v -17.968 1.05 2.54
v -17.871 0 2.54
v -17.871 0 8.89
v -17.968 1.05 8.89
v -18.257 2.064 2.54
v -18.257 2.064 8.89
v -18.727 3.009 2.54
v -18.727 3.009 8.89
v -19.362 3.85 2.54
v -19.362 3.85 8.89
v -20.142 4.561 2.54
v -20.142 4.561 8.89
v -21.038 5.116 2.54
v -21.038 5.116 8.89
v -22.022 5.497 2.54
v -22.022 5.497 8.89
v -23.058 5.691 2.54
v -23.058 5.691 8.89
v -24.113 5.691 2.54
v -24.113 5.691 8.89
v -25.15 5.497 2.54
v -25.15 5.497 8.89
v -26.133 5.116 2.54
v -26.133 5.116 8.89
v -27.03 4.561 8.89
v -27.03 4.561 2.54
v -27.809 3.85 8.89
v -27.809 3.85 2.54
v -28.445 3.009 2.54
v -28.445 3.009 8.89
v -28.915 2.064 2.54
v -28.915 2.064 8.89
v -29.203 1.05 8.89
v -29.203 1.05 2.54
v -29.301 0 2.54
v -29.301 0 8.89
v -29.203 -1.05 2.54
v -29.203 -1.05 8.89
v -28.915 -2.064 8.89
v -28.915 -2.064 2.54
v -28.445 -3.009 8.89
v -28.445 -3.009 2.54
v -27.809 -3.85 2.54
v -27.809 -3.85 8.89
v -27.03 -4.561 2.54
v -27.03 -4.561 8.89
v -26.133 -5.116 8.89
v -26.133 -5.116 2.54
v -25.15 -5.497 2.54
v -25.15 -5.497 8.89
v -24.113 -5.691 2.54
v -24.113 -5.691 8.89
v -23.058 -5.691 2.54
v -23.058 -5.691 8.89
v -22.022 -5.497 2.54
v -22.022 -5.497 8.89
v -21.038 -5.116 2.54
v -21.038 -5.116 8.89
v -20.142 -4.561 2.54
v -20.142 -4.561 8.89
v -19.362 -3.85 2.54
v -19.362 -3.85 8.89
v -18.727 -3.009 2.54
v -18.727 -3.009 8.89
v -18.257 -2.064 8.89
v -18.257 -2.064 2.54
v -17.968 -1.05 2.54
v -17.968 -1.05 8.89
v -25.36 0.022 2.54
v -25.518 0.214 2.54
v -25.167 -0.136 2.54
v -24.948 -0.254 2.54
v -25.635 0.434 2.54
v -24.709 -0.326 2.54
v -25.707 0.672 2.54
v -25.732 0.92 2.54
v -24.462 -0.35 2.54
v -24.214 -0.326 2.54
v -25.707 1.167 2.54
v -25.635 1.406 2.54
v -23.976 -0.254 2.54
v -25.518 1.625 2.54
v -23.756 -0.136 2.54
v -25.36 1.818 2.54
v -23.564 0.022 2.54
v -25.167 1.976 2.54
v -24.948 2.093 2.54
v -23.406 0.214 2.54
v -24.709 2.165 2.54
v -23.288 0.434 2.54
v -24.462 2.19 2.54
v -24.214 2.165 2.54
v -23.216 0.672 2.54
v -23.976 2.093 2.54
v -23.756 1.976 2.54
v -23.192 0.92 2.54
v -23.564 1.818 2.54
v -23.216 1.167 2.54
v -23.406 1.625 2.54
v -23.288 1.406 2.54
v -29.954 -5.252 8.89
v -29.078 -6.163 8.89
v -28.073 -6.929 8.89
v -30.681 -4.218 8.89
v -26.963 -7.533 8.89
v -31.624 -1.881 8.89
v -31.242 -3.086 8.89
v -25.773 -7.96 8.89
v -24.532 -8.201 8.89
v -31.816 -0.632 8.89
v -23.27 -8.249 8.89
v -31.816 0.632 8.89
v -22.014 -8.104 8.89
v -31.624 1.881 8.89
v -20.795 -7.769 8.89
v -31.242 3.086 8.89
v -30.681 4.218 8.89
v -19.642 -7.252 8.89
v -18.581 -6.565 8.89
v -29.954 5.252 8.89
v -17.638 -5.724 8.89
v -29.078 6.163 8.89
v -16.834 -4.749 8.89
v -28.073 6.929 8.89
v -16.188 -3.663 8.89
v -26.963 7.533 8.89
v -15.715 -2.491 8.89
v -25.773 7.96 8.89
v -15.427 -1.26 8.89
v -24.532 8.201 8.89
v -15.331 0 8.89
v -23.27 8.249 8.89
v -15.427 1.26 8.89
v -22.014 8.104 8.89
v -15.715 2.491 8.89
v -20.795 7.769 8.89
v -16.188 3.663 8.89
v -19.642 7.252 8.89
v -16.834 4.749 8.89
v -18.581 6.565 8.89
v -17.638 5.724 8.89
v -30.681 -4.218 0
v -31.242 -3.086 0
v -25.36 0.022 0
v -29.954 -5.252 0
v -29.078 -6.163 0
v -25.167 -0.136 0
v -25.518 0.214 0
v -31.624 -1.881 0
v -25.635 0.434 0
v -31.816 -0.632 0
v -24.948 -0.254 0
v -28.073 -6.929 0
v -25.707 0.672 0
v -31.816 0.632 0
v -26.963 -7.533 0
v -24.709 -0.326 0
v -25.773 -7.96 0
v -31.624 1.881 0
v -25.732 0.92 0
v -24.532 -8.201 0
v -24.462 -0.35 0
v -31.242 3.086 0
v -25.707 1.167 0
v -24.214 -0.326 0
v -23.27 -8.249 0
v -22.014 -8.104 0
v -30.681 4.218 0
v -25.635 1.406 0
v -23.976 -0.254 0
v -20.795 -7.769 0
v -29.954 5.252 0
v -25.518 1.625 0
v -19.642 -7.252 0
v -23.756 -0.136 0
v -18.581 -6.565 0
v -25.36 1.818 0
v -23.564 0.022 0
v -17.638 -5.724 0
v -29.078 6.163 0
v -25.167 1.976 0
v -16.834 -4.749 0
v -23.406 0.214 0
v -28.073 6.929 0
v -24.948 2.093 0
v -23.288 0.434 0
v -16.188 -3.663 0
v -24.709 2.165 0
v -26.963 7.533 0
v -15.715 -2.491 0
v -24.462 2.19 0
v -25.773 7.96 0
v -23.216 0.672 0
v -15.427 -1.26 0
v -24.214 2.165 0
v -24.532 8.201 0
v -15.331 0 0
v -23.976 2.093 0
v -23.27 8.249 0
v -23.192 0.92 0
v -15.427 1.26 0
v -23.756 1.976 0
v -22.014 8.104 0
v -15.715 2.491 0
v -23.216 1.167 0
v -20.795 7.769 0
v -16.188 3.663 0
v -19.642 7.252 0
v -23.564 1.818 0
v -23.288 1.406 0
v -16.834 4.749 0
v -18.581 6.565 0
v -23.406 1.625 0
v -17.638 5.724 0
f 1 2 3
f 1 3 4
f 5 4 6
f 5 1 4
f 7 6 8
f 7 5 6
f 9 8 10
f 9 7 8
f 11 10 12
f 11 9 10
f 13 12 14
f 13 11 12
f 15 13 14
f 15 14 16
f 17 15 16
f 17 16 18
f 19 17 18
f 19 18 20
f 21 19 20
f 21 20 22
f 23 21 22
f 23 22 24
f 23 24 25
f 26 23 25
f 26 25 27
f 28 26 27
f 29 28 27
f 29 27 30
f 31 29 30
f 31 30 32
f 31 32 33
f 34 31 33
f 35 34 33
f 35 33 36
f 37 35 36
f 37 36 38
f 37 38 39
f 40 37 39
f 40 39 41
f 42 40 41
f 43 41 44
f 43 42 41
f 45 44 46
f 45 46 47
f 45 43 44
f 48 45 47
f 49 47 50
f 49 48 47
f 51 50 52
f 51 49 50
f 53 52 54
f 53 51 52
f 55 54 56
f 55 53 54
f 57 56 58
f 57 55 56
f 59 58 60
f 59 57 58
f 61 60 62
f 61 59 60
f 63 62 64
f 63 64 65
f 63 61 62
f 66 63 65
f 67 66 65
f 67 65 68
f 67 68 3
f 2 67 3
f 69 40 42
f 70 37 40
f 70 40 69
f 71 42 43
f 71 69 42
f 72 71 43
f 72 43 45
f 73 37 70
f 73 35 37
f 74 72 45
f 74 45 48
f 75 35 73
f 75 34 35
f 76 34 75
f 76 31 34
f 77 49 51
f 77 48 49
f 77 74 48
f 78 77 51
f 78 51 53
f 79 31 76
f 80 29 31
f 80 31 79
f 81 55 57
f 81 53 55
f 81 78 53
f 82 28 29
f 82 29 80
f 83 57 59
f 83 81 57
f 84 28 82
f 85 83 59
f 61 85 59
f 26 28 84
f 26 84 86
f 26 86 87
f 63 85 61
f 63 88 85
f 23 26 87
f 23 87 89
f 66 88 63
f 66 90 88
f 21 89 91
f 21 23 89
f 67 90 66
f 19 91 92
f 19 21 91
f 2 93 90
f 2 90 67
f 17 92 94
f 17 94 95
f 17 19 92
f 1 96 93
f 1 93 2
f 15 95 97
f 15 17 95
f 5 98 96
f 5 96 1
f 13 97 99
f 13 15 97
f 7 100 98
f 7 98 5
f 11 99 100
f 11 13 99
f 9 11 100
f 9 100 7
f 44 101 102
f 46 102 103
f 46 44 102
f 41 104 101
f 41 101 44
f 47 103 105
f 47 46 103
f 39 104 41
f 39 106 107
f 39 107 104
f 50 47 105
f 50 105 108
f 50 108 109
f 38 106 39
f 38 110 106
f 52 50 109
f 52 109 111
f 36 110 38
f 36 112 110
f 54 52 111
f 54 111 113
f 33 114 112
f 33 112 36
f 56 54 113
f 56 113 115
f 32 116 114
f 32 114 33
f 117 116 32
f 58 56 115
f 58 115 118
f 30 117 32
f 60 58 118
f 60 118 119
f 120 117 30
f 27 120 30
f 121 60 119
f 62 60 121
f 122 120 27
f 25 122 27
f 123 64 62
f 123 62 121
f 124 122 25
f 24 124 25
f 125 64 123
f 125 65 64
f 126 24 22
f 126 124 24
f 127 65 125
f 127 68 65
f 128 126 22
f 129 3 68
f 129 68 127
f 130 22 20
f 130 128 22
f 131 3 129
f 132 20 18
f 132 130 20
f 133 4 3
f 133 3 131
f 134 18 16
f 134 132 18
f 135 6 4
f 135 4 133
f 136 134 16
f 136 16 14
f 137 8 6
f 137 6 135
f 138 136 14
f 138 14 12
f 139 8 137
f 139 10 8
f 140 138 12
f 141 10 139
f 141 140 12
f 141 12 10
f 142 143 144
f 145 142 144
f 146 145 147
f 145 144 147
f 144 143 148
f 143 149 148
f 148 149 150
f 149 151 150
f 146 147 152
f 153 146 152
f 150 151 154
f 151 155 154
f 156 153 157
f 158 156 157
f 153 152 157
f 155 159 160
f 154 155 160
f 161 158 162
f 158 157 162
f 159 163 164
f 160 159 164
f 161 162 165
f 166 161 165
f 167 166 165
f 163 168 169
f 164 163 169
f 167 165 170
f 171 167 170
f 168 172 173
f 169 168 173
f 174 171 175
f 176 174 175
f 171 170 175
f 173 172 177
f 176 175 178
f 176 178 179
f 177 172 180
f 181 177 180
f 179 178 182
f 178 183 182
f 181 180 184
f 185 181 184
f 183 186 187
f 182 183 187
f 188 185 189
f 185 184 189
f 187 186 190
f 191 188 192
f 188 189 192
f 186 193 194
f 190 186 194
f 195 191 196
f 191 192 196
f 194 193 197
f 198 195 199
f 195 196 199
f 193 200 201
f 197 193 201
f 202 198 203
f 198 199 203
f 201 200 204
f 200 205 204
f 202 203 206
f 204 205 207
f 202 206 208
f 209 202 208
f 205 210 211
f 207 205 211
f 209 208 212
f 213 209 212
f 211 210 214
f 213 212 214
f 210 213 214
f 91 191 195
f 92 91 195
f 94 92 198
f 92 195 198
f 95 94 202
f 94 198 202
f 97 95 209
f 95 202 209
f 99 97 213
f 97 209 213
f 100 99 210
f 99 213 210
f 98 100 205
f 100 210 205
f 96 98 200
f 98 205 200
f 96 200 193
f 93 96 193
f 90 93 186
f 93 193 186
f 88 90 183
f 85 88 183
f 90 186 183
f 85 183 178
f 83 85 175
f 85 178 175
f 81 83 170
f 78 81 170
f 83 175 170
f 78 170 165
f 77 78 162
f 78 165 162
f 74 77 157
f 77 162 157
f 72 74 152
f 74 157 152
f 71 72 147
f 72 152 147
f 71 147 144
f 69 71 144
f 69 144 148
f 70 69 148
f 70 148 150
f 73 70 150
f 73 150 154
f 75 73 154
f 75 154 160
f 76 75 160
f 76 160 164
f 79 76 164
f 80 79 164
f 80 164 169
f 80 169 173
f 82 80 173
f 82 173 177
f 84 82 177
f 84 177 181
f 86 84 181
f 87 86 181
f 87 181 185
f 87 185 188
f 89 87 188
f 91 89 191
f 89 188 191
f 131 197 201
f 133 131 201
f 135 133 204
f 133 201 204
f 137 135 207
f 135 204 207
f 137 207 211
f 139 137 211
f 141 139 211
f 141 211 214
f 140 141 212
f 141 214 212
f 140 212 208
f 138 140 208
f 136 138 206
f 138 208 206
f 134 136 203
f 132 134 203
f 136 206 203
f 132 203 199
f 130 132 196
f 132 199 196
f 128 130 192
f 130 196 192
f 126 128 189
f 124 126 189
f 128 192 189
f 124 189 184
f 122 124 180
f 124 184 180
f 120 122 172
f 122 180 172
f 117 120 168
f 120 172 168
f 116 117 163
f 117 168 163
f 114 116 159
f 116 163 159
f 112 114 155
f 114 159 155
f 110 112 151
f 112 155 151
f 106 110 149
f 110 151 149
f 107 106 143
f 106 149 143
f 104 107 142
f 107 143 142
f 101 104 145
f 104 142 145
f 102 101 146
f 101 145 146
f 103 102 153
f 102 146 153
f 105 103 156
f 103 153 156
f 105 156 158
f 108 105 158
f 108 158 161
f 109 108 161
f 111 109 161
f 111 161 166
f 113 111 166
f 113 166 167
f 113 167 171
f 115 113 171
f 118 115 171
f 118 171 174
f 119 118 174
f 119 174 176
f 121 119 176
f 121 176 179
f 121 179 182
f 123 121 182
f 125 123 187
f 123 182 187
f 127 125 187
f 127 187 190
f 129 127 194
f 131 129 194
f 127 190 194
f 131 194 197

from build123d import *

# Parameters (mm, degrees)
F0_R     = 8.255
F1_DEPTH = 8.89
F2_T     = -2.54
F4_DEPTH = 25.4


with BuildPart() as f1:
    # F0 (on Top) → F1 (new body)
    with BuildSketch(Plane.XY):
        with Locations((-23.585714, 0)):
            Circle(F0_R)
    extrude(amount=F1_DEPTH)

    # F2
    f2_openings = [f1.faces().sort_by_distance(p)[0] for p in [
        (-23.585714, 0, 8.89),
    ]]
    offset(amount=F2_T, openings=f2_openings)

    # F3 (on face) → F4 (cut)
    with BuildSketch(Plane(origin=(0, 0, 0), x_dir=(1, 0, 0), z_dir=(0, 0, -1))):
        with BuildLine():
            ThreePointArc((-23.191576, -0.919655), (-25.359602, -0.02163), (-24.461576, -2.189655))
            ThreePointArc((-24.461576, -2.189655), (-23.563551, -1.817681), (-23.191576, -0.919655))
        make_face()
    extrude(amount=-F4_DEPTH, mode=Mode.SUBTRACT)


solid = f1.part
